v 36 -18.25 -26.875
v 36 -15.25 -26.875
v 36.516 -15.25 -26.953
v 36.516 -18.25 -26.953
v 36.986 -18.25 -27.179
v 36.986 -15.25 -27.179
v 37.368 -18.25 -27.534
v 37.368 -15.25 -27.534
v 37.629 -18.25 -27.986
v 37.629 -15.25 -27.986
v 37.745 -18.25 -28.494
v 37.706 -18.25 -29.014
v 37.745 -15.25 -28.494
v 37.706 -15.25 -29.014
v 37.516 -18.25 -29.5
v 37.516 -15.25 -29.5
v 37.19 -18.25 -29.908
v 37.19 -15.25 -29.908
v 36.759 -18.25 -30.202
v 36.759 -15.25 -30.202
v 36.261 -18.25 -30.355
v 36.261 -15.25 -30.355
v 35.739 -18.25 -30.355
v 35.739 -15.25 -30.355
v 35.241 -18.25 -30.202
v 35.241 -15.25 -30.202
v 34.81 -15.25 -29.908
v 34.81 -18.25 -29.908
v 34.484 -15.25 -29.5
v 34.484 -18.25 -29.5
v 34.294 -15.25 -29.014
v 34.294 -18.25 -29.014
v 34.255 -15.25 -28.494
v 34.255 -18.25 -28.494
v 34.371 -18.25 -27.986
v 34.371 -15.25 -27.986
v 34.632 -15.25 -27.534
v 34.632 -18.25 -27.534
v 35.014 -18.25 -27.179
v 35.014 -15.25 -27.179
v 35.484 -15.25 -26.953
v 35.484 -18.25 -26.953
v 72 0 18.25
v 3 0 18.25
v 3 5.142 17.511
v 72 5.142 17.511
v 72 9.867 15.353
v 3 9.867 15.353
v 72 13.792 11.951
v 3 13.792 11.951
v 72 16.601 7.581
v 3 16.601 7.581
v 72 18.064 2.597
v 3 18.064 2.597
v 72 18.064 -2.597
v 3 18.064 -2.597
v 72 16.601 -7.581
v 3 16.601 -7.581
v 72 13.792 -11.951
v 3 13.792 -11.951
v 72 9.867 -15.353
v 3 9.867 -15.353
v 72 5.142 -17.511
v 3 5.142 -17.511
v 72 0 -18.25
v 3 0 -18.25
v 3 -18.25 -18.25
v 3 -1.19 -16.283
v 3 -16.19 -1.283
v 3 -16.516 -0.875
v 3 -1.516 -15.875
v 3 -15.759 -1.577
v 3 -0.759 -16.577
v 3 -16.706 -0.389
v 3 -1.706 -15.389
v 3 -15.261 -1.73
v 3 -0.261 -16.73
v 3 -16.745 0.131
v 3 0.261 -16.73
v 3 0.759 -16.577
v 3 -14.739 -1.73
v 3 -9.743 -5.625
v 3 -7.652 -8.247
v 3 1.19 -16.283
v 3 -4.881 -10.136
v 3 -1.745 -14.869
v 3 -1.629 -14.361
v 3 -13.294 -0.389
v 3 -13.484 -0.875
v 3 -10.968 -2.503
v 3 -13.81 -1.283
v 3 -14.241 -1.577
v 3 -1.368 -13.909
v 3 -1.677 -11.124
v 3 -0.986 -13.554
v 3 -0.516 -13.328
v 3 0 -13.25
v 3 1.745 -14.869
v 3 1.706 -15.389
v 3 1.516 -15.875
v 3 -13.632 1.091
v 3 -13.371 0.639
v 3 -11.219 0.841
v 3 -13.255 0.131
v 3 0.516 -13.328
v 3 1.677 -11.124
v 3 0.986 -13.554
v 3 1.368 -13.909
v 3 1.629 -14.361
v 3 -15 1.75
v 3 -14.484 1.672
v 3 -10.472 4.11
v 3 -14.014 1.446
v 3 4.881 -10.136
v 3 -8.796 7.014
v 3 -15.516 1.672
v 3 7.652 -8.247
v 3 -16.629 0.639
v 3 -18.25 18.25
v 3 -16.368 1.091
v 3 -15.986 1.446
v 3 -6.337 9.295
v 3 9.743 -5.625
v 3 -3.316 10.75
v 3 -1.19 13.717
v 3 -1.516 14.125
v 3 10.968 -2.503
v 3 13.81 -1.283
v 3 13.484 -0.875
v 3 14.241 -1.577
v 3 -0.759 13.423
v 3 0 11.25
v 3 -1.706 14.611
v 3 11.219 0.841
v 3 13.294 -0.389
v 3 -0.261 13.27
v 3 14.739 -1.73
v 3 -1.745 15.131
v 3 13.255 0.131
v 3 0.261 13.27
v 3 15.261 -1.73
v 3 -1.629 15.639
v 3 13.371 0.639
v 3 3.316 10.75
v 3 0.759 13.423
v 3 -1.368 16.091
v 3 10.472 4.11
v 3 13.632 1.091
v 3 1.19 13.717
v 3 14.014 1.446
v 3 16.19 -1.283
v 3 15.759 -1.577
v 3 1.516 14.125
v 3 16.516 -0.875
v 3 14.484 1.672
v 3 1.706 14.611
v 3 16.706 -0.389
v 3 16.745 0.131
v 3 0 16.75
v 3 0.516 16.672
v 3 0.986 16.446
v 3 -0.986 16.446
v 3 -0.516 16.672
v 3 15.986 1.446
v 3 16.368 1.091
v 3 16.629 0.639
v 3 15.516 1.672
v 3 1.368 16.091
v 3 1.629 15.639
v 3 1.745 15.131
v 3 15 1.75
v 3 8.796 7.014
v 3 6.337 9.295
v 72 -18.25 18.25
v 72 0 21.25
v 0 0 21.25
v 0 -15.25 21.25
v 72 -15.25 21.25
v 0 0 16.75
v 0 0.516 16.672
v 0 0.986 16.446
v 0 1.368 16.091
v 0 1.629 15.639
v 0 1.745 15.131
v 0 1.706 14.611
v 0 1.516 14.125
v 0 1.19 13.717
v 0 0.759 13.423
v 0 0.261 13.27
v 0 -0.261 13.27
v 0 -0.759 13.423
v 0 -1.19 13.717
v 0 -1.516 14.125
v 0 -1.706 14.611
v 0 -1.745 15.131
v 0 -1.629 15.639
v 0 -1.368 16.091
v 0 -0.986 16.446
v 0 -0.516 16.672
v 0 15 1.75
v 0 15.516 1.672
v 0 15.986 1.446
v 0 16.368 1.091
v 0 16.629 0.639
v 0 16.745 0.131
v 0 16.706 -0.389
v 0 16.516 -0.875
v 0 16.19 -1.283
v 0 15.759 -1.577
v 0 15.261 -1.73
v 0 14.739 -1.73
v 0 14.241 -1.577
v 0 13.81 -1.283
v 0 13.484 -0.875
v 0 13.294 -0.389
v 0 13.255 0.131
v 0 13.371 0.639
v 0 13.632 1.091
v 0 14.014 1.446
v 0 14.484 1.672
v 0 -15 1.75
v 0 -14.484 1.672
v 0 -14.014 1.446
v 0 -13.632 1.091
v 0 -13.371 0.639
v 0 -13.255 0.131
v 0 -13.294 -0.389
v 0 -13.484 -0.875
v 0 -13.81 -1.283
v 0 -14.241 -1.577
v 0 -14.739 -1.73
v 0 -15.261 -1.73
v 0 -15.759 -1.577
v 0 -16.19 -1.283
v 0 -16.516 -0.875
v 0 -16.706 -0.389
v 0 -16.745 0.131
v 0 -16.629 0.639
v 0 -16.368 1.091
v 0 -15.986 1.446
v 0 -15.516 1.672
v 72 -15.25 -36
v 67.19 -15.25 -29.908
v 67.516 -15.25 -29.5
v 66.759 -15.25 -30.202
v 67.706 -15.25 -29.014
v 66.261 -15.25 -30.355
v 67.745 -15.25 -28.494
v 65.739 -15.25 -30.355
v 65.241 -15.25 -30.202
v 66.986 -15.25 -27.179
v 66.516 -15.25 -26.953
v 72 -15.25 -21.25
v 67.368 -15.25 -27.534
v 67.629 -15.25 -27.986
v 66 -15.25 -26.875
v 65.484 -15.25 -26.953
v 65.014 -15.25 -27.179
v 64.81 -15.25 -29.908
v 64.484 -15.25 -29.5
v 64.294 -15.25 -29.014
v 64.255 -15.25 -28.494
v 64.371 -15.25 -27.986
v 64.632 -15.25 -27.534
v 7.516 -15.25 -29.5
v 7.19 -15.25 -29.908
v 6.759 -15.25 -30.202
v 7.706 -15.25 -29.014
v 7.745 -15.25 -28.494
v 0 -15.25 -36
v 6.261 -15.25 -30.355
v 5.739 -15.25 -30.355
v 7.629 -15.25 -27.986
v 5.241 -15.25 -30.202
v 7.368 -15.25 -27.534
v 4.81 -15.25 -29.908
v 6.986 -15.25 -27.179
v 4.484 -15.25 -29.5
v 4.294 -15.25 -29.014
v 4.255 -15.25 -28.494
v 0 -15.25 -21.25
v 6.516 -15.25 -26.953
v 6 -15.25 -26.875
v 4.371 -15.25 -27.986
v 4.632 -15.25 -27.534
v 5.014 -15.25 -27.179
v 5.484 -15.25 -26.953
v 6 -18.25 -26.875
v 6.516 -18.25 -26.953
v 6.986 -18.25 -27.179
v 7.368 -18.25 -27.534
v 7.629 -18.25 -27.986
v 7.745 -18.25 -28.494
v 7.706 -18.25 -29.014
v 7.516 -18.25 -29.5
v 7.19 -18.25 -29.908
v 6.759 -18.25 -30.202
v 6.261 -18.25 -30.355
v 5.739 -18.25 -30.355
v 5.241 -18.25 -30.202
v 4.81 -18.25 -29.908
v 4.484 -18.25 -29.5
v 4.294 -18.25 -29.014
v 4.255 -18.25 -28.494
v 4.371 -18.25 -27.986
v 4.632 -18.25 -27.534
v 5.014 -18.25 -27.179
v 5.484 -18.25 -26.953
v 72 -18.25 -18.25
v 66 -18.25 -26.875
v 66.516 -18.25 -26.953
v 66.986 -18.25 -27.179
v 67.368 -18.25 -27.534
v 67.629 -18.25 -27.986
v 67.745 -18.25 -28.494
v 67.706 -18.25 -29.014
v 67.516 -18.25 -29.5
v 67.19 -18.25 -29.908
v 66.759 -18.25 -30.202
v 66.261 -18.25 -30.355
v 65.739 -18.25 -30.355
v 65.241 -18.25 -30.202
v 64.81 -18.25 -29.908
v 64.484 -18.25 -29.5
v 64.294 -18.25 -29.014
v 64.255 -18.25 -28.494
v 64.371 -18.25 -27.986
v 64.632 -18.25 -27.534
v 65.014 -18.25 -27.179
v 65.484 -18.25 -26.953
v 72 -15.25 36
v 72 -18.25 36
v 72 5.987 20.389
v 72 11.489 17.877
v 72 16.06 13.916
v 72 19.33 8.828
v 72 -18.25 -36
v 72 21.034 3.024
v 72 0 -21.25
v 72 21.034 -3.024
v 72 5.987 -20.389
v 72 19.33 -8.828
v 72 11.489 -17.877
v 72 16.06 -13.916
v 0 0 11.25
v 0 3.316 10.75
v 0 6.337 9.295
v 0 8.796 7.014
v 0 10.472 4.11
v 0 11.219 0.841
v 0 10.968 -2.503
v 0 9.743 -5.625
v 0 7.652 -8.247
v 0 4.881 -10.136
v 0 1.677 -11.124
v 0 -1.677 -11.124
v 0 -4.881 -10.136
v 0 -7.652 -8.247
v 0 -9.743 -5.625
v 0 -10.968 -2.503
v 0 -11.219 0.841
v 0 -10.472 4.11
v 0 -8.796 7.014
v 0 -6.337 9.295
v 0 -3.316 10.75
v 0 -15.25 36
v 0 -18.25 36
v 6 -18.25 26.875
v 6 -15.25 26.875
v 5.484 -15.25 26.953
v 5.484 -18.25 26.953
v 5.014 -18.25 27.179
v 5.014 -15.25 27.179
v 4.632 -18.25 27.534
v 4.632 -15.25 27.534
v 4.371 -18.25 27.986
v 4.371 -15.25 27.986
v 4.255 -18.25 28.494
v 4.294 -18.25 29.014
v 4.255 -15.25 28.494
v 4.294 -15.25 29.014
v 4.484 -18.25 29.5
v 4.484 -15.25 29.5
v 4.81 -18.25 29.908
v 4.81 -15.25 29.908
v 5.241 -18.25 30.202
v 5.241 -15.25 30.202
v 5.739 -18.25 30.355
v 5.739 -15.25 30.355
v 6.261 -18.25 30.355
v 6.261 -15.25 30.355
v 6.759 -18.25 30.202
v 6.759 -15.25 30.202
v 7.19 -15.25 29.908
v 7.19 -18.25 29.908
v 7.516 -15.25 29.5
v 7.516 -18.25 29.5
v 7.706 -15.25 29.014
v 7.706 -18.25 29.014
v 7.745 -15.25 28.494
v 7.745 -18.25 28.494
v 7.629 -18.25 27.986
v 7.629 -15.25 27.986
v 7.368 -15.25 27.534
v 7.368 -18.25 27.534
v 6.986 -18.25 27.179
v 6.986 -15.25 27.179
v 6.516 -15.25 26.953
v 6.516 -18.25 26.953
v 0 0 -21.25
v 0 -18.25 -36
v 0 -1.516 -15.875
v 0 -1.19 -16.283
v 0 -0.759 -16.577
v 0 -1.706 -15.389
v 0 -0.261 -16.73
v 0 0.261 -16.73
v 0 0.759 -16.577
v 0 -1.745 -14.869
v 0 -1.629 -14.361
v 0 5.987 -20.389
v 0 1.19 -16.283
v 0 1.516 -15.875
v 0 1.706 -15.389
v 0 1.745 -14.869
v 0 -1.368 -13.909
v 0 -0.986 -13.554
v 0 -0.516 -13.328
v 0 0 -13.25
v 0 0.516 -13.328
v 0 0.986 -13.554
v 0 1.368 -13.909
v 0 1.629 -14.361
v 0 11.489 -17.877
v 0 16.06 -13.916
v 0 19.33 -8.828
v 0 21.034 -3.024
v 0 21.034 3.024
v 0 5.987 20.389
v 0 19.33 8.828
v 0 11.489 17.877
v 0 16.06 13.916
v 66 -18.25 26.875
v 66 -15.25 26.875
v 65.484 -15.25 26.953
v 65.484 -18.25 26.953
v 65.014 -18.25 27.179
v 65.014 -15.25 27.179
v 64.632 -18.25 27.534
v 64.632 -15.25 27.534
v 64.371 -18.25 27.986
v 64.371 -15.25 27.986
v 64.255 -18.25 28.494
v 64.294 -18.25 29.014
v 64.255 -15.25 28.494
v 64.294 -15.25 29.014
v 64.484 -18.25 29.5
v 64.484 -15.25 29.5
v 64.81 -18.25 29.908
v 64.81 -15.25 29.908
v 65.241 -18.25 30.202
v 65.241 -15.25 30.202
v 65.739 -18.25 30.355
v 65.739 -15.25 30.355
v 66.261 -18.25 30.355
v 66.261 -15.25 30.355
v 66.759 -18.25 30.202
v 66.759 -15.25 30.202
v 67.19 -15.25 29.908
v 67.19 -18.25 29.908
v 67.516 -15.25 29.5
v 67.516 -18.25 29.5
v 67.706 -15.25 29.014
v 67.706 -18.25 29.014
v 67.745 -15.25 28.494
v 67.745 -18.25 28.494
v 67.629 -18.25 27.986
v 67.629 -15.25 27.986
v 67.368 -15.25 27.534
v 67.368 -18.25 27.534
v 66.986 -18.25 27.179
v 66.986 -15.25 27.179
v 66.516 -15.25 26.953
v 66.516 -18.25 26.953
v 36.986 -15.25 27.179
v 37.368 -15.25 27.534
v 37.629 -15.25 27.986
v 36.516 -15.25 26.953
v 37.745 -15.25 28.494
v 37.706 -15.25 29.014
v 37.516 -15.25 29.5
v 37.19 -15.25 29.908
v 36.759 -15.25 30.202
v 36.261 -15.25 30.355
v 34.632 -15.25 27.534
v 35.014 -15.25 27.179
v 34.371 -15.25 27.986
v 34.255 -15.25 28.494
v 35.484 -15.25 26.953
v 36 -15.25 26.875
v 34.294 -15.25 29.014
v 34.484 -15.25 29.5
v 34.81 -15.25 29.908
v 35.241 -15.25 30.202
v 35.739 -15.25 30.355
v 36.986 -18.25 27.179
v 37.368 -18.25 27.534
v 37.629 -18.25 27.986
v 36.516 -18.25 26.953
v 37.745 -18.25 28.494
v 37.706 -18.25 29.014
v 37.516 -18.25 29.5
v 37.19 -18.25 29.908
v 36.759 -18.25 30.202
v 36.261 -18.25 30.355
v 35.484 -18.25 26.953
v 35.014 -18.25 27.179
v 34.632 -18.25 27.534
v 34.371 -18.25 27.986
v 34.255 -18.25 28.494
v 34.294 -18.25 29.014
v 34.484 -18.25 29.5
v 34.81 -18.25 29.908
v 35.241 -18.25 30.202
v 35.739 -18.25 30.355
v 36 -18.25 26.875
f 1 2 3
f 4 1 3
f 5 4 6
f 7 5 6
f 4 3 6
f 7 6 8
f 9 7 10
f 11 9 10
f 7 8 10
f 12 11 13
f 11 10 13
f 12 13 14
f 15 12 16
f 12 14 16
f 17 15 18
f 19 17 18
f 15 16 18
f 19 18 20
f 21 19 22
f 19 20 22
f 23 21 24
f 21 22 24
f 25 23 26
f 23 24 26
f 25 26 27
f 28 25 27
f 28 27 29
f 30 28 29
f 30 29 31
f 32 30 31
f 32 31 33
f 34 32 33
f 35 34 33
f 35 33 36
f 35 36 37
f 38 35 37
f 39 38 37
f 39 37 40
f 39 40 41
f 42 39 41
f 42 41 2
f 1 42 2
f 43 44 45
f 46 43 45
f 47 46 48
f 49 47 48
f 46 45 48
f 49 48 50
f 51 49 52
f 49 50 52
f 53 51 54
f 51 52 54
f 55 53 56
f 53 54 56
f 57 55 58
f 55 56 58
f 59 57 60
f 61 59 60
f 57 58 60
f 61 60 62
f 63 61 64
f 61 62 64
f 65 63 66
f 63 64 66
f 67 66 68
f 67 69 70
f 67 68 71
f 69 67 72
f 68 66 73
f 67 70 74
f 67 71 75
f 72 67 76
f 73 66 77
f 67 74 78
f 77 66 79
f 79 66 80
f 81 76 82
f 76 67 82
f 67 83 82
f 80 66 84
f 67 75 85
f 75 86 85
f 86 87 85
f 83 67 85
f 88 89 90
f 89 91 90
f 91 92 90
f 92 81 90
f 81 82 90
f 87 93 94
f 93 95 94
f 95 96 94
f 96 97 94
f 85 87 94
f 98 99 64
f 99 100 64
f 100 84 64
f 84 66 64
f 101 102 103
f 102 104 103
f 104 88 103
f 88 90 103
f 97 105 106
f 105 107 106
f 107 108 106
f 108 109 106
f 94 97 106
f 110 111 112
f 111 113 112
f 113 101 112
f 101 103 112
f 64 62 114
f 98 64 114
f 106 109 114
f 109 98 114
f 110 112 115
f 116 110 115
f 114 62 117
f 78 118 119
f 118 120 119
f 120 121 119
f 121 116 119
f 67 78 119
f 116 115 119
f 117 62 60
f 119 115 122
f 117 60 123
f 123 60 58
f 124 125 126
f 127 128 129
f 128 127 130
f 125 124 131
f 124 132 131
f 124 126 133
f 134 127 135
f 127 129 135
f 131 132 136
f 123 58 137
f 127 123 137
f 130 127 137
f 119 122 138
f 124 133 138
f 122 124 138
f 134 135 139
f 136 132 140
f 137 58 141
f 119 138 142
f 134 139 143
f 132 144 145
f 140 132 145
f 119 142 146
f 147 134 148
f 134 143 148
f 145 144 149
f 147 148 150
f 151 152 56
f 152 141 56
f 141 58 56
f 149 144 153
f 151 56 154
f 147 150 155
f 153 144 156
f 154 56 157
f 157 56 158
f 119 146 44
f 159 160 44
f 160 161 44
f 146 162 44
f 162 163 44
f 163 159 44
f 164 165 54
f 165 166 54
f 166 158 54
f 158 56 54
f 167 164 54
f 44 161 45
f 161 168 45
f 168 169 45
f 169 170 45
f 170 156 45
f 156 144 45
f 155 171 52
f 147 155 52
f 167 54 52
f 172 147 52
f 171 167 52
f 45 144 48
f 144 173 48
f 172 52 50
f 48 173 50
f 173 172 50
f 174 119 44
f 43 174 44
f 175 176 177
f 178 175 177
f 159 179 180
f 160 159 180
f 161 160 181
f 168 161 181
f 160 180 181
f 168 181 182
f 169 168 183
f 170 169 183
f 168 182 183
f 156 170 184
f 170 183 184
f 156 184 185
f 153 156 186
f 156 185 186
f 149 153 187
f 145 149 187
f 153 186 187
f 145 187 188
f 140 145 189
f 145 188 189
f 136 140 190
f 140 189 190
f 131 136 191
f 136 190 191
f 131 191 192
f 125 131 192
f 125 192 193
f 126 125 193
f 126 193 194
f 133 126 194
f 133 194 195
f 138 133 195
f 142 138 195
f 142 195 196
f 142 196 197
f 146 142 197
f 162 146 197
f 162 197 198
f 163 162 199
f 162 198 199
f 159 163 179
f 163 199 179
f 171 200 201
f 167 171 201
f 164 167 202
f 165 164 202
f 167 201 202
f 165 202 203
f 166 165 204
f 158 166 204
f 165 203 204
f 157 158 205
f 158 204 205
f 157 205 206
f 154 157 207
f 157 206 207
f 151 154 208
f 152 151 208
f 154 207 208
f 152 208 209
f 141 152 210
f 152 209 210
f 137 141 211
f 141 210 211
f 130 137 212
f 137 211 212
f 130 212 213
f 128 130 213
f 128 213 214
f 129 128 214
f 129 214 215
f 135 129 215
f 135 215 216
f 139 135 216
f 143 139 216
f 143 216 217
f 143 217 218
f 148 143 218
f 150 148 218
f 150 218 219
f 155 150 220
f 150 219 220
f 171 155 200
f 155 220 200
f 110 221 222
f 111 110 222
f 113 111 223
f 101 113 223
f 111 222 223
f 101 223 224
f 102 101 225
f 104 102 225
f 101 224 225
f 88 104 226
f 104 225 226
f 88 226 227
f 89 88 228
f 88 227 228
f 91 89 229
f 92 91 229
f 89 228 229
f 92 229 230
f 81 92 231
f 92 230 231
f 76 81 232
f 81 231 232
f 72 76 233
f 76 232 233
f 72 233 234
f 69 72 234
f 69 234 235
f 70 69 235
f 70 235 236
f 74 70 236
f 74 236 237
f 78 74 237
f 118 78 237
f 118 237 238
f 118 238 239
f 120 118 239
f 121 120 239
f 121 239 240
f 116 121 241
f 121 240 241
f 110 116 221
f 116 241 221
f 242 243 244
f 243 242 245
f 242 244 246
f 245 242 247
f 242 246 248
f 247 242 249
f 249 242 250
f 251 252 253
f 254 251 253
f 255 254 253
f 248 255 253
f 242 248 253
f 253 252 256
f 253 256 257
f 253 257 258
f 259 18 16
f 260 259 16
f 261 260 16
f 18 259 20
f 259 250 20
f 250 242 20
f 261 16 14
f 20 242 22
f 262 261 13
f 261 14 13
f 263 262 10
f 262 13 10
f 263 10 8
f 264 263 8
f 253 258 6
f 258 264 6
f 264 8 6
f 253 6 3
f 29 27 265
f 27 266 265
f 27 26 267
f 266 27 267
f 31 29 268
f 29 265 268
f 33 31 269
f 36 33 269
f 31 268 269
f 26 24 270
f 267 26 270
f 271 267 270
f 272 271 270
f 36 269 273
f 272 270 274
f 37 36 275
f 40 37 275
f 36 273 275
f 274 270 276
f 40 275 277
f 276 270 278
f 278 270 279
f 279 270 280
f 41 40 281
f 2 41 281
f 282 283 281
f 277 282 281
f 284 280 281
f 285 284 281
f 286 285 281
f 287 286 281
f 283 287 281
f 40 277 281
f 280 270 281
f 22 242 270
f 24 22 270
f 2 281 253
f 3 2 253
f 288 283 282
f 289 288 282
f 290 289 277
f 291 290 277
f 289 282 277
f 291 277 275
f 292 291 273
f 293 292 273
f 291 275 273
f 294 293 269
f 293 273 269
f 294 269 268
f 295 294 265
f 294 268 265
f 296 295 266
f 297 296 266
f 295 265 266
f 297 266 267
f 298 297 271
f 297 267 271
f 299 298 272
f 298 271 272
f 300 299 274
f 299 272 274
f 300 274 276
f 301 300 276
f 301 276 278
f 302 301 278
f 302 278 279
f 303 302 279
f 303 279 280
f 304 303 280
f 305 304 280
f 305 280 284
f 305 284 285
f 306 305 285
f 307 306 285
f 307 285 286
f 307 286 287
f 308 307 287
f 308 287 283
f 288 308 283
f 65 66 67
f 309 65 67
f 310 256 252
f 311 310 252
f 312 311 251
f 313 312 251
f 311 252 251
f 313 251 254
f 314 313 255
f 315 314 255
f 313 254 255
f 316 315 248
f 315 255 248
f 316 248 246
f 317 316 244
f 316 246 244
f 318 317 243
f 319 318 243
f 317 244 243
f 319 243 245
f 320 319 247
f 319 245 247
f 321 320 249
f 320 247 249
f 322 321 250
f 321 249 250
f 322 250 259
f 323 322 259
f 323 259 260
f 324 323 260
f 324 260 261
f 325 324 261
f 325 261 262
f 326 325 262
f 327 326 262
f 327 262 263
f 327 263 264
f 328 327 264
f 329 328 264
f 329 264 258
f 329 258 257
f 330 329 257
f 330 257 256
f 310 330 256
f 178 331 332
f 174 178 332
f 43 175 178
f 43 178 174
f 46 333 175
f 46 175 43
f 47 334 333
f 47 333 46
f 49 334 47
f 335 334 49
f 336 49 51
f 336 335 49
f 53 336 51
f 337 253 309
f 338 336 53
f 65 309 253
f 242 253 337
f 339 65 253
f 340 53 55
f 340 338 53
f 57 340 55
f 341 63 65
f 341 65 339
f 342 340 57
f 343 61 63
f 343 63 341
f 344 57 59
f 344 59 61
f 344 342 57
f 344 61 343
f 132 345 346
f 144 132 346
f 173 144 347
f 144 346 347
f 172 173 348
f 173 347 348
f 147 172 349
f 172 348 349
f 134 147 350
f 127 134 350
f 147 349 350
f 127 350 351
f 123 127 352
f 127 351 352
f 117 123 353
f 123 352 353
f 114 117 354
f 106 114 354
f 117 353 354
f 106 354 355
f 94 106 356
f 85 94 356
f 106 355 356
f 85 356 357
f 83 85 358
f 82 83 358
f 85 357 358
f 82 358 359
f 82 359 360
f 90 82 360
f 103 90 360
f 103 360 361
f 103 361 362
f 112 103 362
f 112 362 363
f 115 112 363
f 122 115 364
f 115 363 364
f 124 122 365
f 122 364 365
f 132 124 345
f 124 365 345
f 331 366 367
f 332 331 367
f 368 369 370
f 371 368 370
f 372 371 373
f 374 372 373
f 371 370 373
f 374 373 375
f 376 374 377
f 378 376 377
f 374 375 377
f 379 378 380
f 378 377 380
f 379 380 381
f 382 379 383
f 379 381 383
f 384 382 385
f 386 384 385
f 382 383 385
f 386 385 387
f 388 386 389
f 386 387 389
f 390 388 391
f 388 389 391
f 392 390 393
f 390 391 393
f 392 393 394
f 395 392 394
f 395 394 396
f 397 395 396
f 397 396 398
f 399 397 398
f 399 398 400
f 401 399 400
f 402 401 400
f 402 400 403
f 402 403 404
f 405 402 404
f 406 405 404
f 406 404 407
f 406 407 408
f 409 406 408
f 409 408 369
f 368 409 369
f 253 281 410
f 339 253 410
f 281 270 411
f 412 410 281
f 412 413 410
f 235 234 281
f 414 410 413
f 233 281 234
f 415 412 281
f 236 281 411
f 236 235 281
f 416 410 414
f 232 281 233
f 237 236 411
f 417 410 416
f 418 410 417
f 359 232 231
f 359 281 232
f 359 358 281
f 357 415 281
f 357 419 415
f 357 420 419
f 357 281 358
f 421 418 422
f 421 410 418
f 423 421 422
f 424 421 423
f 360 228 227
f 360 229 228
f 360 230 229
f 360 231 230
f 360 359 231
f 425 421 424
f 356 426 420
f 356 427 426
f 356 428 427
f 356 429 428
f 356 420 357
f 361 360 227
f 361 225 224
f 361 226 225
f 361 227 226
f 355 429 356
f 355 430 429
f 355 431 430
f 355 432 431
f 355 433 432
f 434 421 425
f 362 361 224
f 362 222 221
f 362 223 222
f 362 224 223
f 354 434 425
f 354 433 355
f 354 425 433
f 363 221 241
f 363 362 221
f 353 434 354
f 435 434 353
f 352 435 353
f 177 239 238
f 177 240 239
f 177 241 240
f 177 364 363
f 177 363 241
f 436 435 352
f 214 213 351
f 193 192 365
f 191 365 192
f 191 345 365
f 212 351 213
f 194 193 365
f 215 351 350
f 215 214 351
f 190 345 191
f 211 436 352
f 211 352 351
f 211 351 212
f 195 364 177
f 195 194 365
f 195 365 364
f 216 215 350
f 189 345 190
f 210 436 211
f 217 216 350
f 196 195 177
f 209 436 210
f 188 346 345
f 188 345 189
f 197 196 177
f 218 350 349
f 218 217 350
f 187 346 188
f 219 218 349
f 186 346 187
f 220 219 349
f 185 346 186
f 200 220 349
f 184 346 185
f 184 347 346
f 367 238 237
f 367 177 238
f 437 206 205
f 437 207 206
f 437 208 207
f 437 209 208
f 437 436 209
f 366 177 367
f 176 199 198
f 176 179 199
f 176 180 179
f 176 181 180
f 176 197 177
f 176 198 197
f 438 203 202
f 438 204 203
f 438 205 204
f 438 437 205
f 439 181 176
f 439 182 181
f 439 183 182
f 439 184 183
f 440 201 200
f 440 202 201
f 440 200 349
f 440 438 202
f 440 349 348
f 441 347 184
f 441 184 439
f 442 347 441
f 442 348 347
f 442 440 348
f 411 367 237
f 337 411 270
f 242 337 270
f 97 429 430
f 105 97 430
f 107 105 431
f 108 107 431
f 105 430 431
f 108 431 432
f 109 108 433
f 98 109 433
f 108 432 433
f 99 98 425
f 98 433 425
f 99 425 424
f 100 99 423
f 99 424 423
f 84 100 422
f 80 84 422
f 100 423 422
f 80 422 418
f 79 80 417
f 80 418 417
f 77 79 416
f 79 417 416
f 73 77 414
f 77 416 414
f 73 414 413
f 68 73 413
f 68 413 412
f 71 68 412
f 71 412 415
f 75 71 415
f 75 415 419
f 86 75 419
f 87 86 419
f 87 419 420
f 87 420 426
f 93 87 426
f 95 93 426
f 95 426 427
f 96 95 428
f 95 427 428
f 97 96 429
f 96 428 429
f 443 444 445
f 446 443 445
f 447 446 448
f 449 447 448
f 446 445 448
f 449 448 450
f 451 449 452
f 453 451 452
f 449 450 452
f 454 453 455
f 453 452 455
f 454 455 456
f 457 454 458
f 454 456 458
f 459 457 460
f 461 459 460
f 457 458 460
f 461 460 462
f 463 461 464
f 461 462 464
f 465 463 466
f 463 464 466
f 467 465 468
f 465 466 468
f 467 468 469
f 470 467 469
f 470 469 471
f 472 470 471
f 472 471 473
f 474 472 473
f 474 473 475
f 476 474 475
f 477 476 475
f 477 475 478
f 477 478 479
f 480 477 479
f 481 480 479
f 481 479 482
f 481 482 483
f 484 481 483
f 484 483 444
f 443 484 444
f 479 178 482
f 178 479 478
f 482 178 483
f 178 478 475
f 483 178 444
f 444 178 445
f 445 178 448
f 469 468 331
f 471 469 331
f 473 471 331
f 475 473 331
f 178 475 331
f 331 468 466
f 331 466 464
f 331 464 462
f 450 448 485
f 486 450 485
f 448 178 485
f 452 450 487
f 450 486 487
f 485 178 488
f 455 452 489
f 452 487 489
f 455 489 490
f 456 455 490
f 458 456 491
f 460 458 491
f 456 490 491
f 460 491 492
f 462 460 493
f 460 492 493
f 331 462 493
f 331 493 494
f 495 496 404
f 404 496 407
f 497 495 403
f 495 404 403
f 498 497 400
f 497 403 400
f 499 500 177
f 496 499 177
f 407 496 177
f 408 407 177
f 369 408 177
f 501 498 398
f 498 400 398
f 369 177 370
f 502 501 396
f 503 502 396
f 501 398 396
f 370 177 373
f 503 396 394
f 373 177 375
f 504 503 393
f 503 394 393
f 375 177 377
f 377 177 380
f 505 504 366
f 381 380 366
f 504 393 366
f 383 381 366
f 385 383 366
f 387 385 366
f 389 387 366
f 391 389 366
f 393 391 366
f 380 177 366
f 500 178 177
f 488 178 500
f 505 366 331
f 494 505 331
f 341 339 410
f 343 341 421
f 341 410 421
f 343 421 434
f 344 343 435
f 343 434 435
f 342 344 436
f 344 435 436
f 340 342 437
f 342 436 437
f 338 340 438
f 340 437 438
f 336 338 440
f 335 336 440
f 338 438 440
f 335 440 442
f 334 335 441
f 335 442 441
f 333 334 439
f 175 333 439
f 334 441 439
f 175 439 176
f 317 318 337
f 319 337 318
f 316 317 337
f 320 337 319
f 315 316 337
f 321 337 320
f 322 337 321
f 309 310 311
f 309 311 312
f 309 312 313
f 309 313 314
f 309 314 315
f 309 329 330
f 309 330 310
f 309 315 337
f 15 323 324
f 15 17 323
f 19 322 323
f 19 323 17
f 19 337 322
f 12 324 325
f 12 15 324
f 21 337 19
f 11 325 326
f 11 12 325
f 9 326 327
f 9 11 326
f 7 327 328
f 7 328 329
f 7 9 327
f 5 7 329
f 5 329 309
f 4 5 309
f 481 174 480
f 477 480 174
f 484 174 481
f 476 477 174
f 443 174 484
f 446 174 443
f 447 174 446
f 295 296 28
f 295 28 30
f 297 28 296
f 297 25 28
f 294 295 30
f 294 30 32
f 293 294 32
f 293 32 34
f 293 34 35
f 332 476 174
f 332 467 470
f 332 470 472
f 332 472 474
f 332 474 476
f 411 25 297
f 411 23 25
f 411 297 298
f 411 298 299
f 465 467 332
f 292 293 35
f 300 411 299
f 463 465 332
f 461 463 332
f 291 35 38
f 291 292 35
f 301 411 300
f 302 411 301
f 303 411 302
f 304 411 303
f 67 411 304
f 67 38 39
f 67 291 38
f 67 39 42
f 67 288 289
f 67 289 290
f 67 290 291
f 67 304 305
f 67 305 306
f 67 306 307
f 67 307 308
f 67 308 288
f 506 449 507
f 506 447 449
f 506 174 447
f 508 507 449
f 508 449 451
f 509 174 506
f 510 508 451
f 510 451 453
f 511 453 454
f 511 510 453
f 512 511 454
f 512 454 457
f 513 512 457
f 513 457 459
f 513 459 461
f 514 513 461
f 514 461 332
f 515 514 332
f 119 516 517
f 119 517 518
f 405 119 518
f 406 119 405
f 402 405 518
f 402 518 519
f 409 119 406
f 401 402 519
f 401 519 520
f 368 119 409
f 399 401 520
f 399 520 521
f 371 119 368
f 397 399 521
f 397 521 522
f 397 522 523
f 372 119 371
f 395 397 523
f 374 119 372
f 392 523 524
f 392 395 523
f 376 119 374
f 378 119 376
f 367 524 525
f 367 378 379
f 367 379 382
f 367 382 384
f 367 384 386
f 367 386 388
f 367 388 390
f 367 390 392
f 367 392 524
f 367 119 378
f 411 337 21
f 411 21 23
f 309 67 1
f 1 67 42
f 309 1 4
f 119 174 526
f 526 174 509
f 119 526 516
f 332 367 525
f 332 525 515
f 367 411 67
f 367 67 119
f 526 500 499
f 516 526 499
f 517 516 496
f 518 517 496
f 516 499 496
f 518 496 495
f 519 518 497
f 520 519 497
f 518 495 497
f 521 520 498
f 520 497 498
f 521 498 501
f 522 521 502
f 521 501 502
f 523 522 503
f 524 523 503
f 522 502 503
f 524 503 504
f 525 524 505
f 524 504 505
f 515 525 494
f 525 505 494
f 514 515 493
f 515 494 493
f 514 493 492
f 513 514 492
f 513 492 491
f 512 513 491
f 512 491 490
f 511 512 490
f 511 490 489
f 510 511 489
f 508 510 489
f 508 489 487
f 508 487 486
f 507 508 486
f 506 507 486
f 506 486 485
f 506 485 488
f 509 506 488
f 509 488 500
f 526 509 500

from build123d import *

# Parameters (mm, degrees)
BOSS_EXTRUDE1_DEPTH = 72
SKETCH2_R           = 11.25
SKETCH2_R_2         = 1.75
BOSS_EXTRUDE2_DEPTH = 3
SKETCH3_R           = 1.75
CUT_EXTRUDE1_DEPTH  = 89.386933423


with BuildPart() as part:
    # Sketch1 → Boss-Extrude1 (new body)
    with BuildSketch(Plane(origin=(0, 0, 0), x_dir=(0, 0, -1), z_dir=(1, 0, 0))):
        with BuildLine():
            Line((18.25, 0), (18.25, -18.25))
            Line((18.25, -18.25), (36, -18.25))
            Line((36, -18.25), (36, -15.25))
            Line((36, -15.25), (21.25, -15.25))
            Line((21.25, -15.25), (21.25, 0))
            ThreePointArc((21.25, 0), (0, 21.25), (-21.25, 0))
            Line((-21.25, 0), (-21.25, -15.25))
            Line((-21.25, -15.25), (-36, -15.25))
            Line((-36, -15.25), (-36, -18.25))
            Line((-36, -18.25), (-18.25, -18.25))
            Line((-18.25, -18.25), (-18.25, 0))
            ThreePointArc((-18.25, 0), (0, 18.25), (18.25, 0))
        make_face()
    extrude(amount=BOSS_EXTRUDE1_DEPTH)

    # Sketch2 → Boss-Extrude2 (add)
    with BuildSketch(Plane.ZY):
        with BuildLine():
            Line((-18.25, -18.25), (18.25, -18.25))
            Line((18.25, -18.25), (18.25, 0))
            ThreePointArc((18.25, 0), (0, 18.25), (-18.25, 0))
            Line((-18.25, 0), (-18.25, -18.25))
        make_face()
        Circle(SKETCH2_R, mode=Mode.SUBTRACT)
        with Locations((-15, 0)):
            Circle(SKETCH2_R_2, mode=Mode.SUBTRACT)
        with Locations((0, 15)):
            Circle(SKETCH2_R_2, mode=Mode.SUBTRACT)
        with Locations((15, 0)):
            Circle(SKETCH2_R_2, mode=Mode.SUBTRACT)
        with Locations((0, -15)):
            Circle(SKETCH2_R_2, mode=Mode.SUBTRACT)
    extrude(amount=-BOSS_EXTRUDE2_DEPTH)

    # Sketch3 → Cut-Extrude1 (cut, through all)
    with BuildSketch(Plane(origin=(0, -15.25, 0), x_dir=(1, 0, 0), z_dir=(0, 1, 0))):
        with Locations(Location((36, 28.625, 0), (0, 0, 270))):
            Circle(SKETCH3_R)
        with Locations(Location((6, 28.625, 0), (0, 0, 270))):
            Circle(SKETCH3_R)
        with Locations(Location((66, 28.625, 0), (0, 0, 270))):
            Circle(SKETCH3_R)
        with Locations(Location((66, -28.625, 0), (0, 0, 90))):
            Circle(SKETCH3_R)
        with Locations(Location((36, -28.625, 0), (0, 0, 90))):
            Circle(SKETCH3_R)
        with Locations(Location((6, -28.625, 0), (0, 0, 90))):
            Circle(SKETCH3_R)
    extrude(amount=-CUT_EXTRUDE1_DEPTH, mode=Mode.SUBTRACT)


solid = part.part
